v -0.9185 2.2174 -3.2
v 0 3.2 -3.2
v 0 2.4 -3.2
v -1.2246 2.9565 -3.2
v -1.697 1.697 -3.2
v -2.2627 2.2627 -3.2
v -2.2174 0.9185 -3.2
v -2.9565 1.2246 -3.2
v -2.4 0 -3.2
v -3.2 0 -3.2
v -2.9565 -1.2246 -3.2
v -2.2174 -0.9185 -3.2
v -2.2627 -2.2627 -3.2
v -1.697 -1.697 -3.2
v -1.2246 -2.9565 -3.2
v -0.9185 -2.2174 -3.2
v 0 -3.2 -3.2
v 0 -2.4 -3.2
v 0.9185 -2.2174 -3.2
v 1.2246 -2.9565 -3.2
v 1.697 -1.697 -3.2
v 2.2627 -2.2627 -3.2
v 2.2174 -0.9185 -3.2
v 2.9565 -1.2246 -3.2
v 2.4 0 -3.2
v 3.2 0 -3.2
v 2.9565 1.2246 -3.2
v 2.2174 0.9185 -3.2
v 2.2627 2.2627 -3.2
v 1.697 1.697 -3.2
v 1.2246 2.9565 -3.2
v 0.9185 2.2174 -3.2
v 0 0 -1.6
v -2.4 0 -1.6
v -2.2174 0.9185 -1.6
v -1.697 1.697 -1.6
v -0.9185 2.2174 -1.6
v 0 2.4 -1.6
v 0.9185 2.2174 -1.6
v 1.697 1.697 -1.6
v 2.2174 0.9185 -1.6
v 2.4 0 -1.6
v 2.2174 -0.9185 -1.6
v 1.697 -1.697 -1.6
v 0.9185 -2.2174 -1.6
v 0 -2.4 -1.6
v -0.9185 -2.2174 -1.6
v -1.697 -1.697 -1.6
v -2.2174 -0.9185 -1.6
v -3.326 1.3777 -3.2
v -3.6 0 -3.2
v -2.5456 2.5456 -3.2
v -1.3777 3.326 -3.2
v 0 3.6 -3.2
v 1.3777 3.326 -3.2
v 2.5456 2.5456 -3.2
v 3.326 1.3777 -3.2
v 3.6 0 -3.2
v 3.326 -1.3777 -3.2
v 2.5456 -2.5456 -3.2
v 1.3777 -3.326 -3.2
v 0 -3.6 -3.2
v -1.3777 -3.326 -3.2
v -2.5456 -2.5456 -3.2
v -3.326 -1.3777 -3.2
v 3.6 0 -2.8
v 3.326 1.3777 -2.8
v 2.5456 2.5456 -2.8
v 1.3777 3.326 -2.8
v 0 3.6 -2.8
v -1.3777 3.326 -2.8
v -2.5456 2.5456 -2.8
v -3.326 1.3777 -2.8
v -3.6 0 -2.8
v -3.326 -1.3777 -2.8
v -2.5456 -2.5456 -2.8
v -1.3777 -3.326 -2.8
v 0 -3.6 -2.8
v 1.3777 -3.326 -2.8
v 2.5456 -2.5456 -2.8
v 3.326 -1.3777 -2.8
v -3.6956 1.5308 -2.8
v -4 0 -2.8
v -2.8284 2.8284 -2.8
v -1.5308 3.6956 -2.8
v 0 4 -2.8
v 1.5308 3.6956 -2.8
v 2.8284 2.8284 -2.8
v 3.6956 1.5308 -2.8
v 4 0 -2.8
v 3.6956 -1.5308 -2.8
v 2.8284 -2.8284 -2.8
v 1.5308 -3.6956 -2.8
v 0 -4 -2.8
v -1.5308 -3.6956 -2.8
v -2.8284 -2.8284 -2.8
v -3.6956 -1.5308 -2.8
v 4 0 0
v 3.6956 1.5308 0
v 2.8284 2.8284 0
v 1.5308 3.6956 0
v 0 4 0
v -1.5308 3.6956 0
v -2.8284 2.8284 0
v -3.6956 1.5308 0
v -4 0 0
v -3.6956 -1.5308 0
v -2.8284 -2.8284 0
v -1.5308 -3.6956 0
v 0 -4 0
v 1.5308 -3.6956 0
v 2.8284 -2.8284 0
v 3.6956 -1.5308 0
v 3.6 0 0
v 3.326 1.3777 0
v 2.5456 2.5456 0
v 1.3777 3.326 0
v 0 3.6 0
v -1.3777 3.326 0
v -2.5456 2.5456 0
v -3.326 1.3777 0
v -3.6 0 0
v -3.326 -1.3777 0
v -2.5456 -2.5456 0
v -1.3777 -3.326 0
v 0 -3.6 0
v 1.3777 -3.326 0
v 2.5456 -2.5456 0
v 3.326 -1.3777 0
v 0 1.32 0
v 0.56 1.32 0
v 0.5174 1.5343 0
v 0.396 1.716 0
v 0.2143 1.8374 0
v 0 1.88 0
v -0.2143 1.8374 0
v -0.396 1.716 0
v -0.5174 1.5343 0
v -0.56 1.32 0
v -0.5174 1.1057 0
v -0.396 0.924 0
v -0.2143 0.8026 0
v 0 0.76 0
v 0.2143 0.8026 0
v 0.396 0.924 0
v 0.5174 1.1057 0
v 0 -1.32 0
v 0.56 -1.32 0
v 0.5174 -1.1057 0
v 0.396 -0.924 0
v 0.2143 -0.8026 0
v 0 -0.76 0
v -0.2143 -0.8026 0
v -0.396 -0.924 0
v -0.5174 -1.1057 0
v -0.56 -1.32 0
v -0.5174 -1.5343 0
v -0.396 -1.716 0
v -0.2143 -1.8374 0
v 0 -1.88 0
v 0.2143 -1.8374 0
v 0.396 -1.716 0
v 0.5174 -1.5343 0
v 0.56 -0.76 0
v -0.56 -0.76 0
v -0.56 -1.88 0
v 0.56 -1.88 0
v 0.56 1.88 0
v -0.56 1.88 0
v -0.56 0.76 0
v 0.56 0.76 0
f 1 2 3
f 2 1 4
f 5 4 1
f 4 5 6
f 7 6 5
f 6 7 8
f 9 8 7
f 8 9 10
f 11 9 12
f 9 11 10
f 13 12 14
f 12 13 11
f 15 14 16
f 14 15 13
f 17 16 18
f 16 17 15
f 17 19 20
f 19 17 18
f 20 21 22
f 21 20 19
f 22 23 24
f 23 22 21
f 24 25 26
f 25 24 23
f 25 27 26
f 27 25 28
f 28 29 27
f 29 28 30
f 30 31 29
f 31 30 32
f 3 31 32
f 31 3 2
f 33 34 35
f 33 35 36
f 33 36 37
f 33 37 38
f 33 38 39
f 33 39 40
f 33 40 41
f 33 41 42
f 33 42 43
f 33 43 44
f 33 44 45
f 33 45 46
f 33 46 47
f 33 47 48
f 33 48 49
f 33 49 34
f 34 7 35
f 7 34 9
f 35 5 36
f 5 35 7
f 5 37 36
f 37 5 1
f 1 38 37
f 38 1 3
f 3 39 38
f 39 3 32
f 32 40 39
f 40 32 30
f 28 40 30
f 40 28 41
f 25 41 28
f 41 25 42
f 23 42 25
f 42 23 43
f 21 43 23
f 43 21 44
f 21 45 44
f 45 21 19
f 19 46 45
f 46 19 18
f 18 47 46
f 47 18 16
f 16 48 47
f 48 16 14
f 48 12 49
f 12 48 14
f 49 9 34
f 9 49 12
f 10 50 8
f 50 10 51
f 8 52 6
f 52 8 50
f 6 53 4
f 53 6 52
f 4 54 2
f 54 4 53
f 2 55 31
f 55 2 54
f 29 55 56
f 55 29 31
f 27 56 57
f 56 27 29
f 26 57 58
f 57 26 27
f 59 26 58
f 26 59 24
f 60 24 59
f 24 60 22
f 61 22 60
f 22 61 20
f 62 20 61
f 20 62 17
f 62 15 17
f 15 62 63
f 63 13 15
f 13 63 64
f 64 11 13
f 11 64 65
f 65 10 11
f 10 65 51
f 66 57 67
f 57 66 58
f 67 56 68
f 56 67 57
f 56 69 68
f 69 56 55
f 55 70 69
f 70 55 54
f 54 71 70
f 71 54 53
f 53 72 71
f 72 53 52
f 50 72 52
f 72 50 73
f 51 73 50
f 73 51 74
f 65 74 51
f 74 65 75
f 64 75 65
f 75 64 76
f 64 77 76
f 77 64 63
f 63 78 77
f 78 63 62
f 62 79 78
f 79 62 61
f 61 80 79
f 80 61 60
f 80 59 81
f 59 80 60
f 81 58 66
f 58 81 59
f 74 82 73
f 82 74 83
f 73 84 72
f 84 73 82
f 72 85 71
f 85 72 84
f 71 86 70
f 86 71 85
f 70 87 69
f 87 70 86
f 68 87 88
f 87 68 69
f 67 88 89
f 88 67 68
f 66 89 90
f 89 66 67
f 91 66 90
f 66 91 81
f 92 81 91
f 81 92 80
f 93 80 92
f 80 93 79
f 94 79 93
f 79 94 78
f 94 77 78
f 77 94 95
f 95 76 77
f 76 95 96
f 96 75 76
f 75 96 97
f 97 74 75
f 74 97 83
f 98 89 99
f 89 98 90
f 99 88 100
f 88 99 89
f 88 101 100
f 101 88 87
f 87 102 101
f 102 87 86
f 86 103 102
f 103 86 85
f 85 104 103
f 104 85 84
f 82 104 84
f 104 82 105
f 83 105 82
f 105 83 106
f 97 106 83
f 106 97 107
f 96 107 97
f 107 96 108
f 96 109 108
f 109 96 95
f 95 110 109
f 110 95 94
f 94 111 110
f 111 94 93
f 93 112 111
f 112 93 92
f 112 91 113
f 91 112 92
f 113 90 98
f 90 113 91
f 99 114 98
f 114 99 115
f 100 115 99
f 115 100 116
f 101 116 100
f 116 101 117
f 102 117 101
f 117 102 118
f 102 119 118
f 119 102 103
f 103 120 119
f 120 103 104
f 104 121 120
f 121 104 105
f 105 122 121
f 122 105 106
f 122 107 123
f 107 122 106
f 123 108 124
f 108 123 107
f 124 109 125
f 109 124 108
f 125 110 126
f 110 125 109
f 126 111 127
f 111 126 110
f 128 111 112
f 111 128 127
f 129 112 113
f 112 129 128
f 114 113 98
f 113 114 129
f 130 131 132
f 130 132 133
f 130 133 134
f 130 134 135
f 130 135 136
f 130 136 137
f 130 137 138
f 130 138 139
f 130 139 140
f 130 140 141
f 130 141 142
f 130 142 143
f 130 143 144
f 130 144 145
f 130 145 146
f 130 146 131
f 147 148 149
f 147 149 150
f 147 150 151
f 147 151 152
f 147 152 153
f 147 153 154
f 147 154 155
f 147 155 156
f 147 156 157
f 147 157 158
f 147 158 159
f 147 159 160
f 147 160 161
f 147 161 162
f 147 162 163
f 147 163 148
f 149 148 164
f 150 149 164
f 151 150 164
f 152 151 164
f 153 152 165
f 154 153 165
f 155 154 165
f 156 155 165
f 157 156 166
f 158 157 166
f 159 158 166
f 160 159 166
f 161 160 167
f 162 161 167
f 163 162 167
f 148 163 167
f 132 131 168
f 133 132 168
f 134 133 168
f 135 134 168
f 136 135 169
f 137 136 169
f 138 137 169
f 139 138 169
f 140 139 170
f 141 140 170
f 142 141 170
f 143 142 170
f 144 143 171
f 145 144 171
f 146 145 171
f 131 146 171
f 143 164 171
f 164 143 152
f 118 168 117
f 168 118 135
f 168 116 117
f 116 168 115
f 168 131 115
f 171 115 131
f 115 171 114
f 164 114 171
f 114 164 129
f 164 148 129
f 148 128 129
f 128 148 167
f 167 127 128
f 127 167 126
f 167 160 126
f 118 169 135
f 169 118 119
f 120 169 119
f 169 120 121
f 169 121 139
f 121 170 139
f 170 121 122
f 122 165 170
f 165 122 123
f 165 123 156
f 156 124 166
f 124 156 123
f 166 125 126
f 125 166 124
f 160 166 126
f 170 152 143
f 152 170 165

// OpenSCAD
// file: ../p/4-4ring3.scad
use <../lib.scad>
function ldraw_lib__4_4ring3() = [
// 0 Ring  3 x 1.0
// 0 Name: 4-4ring3.dat
// 0 Author: James Jessiman
// 0 !LDRAW_ORG Primitive UPDATE 2009-01
// 0 !LICENSE Licensed under CC BY 2.0 and CC BY 4.0 : see CAreadme.txt
// 
// 0 BFC CERTIFY CCW
  [0,"BFC","CERTIFY"],
  [0,"BFC","CCW"],
// 
// 0 !HISTORY 1998-12-15 [PTadmin] Official Update 1998-10
// 0 !HISTORY 2002-04-05 [hafhead] Added BFC statement
// 0 !HISTORY 2002-04-25 [PTadmin] Official Update 2002-02
// 0 !HISTORY 2007-06-24 [PTadmin] Header formatted for Contributor Agreement
// 0 !HISTORY 2008-07-01 [PTadmin] Official Update 2008-01
// 0 !HISTORY 2008-08-26 [cwdee] Switch polygon winding and rename
// 0 !HISTORY 2009-05-02 [PTadmin] Official Update 2009-01
// 
// 
// 4 16 -1.5308 0 3.6956 -1.1481 0 2.7717 0 0 3 0 0 4
  [4,16,-1.5308,0,3.6956,-1.1481,0,2.7717,0,0,3,0,0,4],
// 4 16 -2.8284 0 2.8284 -2.1213 0 2.1213 -1.1481 0 2.7717 -1.5308 0 3.6956
  [4,16,-2.8284,0,2.8284,-2.1213,0,2.1213,-1.1481,0,2.7717,-1.5308,0,3.6956],
// 4 16 -3.6956 0 1.5308 -2.7717 0 1.1481 -2.1213 0 2.1213 -2.8284 0 2.8284
  [4,16,-3.6956,0,1.5308,-2.7717,0,1.1481,-2.1213,0,2.1213,-2.8284,0,2.8284],
// 4 16 -4 0 0 -3 0 0 -2.7717 0 1.1481 -3.6956 0 1.5308
  [4,16,-4,0,0,-3,0,0,-2.7717,0,1.1481,-3.6956,0,1.5308],
// 4 16 -3.6956 0 -1.5308 -2.7717 0 -1.1481 -3 0 0 -4 0 0
  [4,16,-3.6956,0,-1.5308,-2.7717,0,-1.1481,-3,0,0,-4,0,0],
// 4 16 -2.8284 0 -2.8284 -2.1213 0 -2.1213 -2.7717 0 -1.1481 -3.6956 0 -1.5308
  [4,16,-2.8284,0,-2.8284,-2.1213,0,-2.1213,-2.7717,0,-1.1481,-3.6956,0,-1.5308],
// 4 16 -1.5308 0 -3.6956 -1.1481 0 -2.7717 -2.1213 0 -2.1213 -2.8284 0 -2.8284
  [4,16,-1.5308,0,-3.6956,-1.1481,0,-2.7717,-2.1213,0,-2.1213,-2.8284,0,-2.8284],
// 4 16 0 0 -4 0 0 -3 -1.1481 0 -2.7717 -1.5308 0 -3.6956
  [4,16,0,0,-4,0,0,-3,-1.1481,0,-2.7717,-1.5308,0,-3.6956],
// 4 16 1.5308 0 -3.6956 1.1481 0 -2.7717 0 0 -3 0 0 -4
  [4,16,1.5308,0,-3.6956,1.1481,0,-2.7717,0,0,-3,0,0,-4],
// 4 16 2.8284 0 -2.8284 2.1213 0 -2.1213 1.1481 0 -2.7717 1.5308 0 -3.6956
  [4,16,2.8284,0,-2.8284,2.1213,0,-2.1213,1.1481,0,-2.7717,1.5308,0,-3.6956],
// 4 16 3.6956 0 -1.5308 2.7717 0 -1.1481 2.1213 0 -2.1213 2.8284 0 -2.8284
  [4,16,3.6956,0,-1.5308,2.7717,0,-1.1481,2.1213,0,-2.1213,2.8284,0,-2.8284],
// 4 16 4 0 0 3 0 0 2.7717 0 -1.1481 3.6956 0 -1.5308
  [4,16,4,0,0,3,0,0,2.7717,0,-1.1481,3.6956,0,-1.5308],
// 4 16 3.6956 0 1.5308 2.7717 0 1.1481 3 0 0 4 0 0
  [4,16,3.6956,0,1.5308,2.7717,0,1.1481,3,0,0,4,0,0],
// 4 16 2.8284 0 2.8284 2.1213 0 2.1213 2.7717 0 1.1481 3.6956 0 1.5308
  [4,16,2.8284,0,2.8284,2.1213,0,2.1213,2.7717,0,1.1481,3.6956,0,1.5308],
// 4 16 1.5308 0 3.6956 1.1481 0 2.7717 2.1213 0 2.1213 2.8284 0 2.8284
  [4,16,1.5308,0,3.6956,1.1481,0,2.7717,2.1213,0,2.1213,2.8284,0,2.8284],
// 4 16 0 0 4 0 0 3 1.1481 0 2.7717 1.5308 0 3.6956
  [4,16,0,0,4,0,0,3,1.1481,0,2.7717,1.5308,0,3.6956],
// 0
];
module ldraw_lib__4_4ring3(step=0, col=false, unit=2/5, alt=false, line=0.2, solid=!$preview)
    makepoly(ldraw_lib__4_4ring3(), step=step, col=col, unit=unit, alt=alt, line=line, solid=solid);
ldraw_lib__4_4ring3(line=0.2);
// file: ../p/4-4cylc.scad
use <../lib.scad>
use <4-4cyli.scad>
use <4-4disc.scad>
use <4-4edge.scad>
function ldraw_lib__4_4cylc() = [
// 0 Cylinder Closed 1.0
// 0 Name: 4-4cylc.dat
// 0 Author: Alex Taylor [anathema]
// 0 !LDRAW_ORG Primitive UPDATE 2009-02
// 0 !LICENSE Licensed under CC BY 2.0 and CC BY 4.0 : see CAreadme.txt
// 
// 0 BFC CERTIFY CCW
  [0,"BFC","CERTIFY"],
  [0,"BFC","CCW"],
// 
// 0 !HISTORY 2008-12-29 [cwdee] Removed one disc
// 0 !HISTORY 2009-09-03 [PTadmin] Official Update 2009-02
// 
// 
// 1 16 0 0 0 1 0 0 0 1 0 0 0 1 4-4edge.dat
  [1,16,0,0,0,1,0,0,0,1,0,0,0,1, ldraw_lib__4_4edge()],
// 1 16 0 1 0 1 0 0 0 1 0 0 0 1 4-4edge.dat
  [1,16,0,1,0,1,0,0,0,1,0,0,0,1, ldraw_lib__4_4edge()],
// 1 16 0 0 0 1 0 0 0 1 0 0 0 1 4-4disc.dat
  [1,16,0,0,0,1,0,0,0,1,0,0,0,1, ldraw_lib__4_4disc()],
// 1 16 0 0 0 1 0 0 0 1 0 0 0 1 4-4cyli.dat
  [1,16,0,0,0,1,0,0,0,1,0,0,0,1, ldraw_lib__4_4cyli()],
// 0
];
module ldraw_lib__4_4cylc(step=0, col=false, unit=2/5, alt=false, line=0.2, solid=!$preview)
    makepoly(ldraw_lib__4_4cylc(), step=step, col=col, unit=unit, alt=alt, line=line, solid=solid);
ldraw_lib__4_4cylc(line=0.2);
// file: ../p/4-4edge.scad
use <../lib.scad>
function ldraw_lib__4_4edge() = [
// 0 Circle 1.0
// 0 Name: 4-4edge.dat
// 0 Author: James Jessiman
// 0 !LDRAW_ORG Primitive UPDATE 2017-01
// 0 !LICENSE Licensed under CC BY 4.0 : see CAreadme.txt
// 
// 0 BFC CERTIFY CCW
  [0,"BFC","CERTIFY"],
  [0,"BFC","CCW"],
// 
// 0 !HISTORY 1998-12-15 [PTadmin] Official Update 1998-10
// 0 !HISTORY 2005-12-28 [PTadmin] Official Update 2005-01
// 0 !HISTORY 2007-06-24 [PTadmin] Header formatted for Contributor Agreement
// 0 !HISTORY 2008-07-01 [PTadmin] Official Update 2008-01
// 0 !HISTORY 2017-01-15 [Steffen] BFCed
// 0 !HISTORY 2017-12-30 [PTadmin] Official Update 2017-01
// 
// 
// 2 24 1 0 0 0.9239 0 0.3827
  [2,24,1,0,0,0.9239,0,0.3827],
// 2 24 0.9239 0 0.3827 0.7071 0 0.7071
  [2,24,0.9239,0,0.3827,0.7071,0,0.7071],
// 2 24 0.7071 0 0.7071 0.3827 0 0.9239
  [2,24,0.7071,0,0.7071,0.3827,0,0.9239],
// 2 24 0.3827 0 0.9239 0 0 1
  [2,24,0.3827,0,0.9239,0,0,1],
// 2 24 0 0 1 -0.3827 0 0.9239
  [2,24,0,0,1,-0.3827,0,0.9239],
// 2 24 -0.3827 0 0.9239 -0.7071 0 0.7071
  [2,24,-0.3827,0,0.9239,-0.7071,0,0.7071],
// 2 24 -0.7071 0 0.7071 -0.9239 0 0.3827
  [2,24,-0.7071,0,0.7071,-0.9239,0,0.3827],
// 2 24 -0.9239 0 0.3827 -1 0 -0
  [2,24,-0.9239,0,0.3827,-1,0,-0],
// 2 24 -1 0 -0 -0.9239 0 -0.3827
  [2,24,-1,0,-0,-0.9239,0,-0.3827],
// 2 24 -0.9239 0 -0.3827 -0.7071 0 -0.7071
  [2,24,-0.9239,0,-0.3827,-0.7071,0,-0.7071],
// 2 24 -0.7071 0 -0.7071 -0.3827 0 -0.9239
  [2,24,-0.7071,0,-0.7071,-0.3827,0,-0.9239],
// 2 24 -0.3827 0 -0.9239 0 0 -1
  [2,24,-0.3827,0,-0.9239,0,0,-1],
// 2 24 0 0 -1 0.3827 0 -0.9239
  [2,24,0,0,-1,0.3827,0,-0.9239],
// 2 24 0.3827 0 -0.9239 0.7071 0 -0.7071
  [2,24,0.3827,0,-0.9239,0.7071,0,-0.7071],
// 2 24 0.7071 0 -0.7071 0.9239 0 -0.3827
  [2,24,0.7071,0,-0.7071,0.9239,0,-0.3827],
// 2 24 0.9239 0 -0.3827 1 0 0
  [2,24,0.9239,0,-0.3827,1,0,0],
];
module ldraw_lib__4_4edge(step=0, col=false, unit=2/5, alt=false, line=0.2, solid=!$preview)
    makepoly(ldraw_lib__4_4edge(), step=step, col=col, unit=unit, alt=alt, line=line, solid=solid);
ldraw_lib__4_4edge(line=0.2);
// file: ../p/4-4cyli.scad
use <../lib.scad>
function ldraw_lib__4_4cyli() = [
// 0 Cylinder 1.0
// 0 Name: 4-4cyli.dat
// 0 Author: James Jessiman
// 0 !LDRAW_ORG Primitive UPDATE 2005-01
// 0 !LICENSE Licensed under CC BY 2.0 and CC BY 4.0 : see CAreadme.txt
// 
// 0 BFC CERTIFY CCW
  [0,"BFC","CERTIFY"],
  [0,"BFC","CCW"],
// 
// 0 !HISTORY 1998-12-15 [PTadmin] Official Update 1998-10
// 0 !HISTORY 2002-03-23 [sbliss] Added BFC statement; merged headers from files in distributions LDraw 0.27 and Complete.
// 0 !HISTORY 2002-04-25 [PTadmin] Official Update 2002-02
// 0 !HISTORY 2004-12-14 [guyvivan] BFC CCW
// 0 !HISTORY 2005-12-28 [PTadmin] Official Update 2005-01
// 0 !HISTORY 2007-06-24 [PTadmin] Header formatted for Contributor Agreement
// 0 !HISTORY 2008-07-01 [PTadmin] Official Update 2008-01
// 
// 
// 4 16 1 1 0 0.9239 1 0.3827 0.9239 0 0.3827 1 0 0
  [4,16,1,1,0,0.9239,1,0.3827,0.9239,0,0.3827,1,0,0],
// 5 24 1 0 0 1 1 0 0.9239 0 0.3827 0.9239 0 -0.3827
  [5,24,1,0,0,1,1,0,0.9239,0,0.3827,0.9239,0,-0.3827],
// 4 16 0.9239 1 0.3827 0.7071 1 0.7071 0.7071 0 0.7071 0.9239 0 0.3827
  [4,16,0.9239,1,0.3827,0.7071,1,0.7071,0.7071,0,0.7071,0.9239,0,0.3827],
// 5 24 0.9239 0 0.3827 0.9239 1 0.3827 0.7071 0 0.7071 1 0 0
  [5,24,0.9239,0,0.3827,0.9239,1,0.3827,0.7071,0,0.7071,1,0,0],
// 4 16 0.7071 1 0.7071 0.3827 1 0.9239 0.3827 0 0.9239 0.7071 0 0.7071
  [4,16,0.7071,1,0.7071,0.3827,1,0.9239,0.3827,0,0.9239,0.7071,0,0.7071],
// 5 24 0.7071 0 0.7071 0.7071 1 0.7071 0.3827 0 0.9239 0.9239 0 0.3827
  [5,24,0.7071,0,0.7071,0.7071,1,0.7071,0.3827,0,0.9239,0.9239,0,0.3827],
// 4 16 0.3827 1 0.9239 0 1 1 0 0 1 0.3827 0 0.9239
  [4,16,0.3827,1,0.9239,0,1,1,0,0,1,0.3827,0,0.9239],
// 5 24 0.3827 0 0.9239 0.3827 1 0.9239 0 0 1 0.7071 0 0.7071
  [5,24,0.3827,0,0.9239,0.3827,1,0.9239,0,0,1,0.7071,0,0.7071],
// 4 16 0 1 1 -0.3827 1 0.9239 -0.3827 0 0.9239 0 0 1
  [4,16,0,1,1,-0.3827,1,0.9239,-0.3827,0,0.9239,0,0,1],
// 5 24 0 0 1 0 1 1 -0.3827 0 0.9239 0.3827 0 0.9239
  [5,24,0,0,1,0,1,1,-0.3827,0,0.9239,0.3827,0,0.9239],
// 4 16 -0.3827 1 0.9239 -0.7071 1 0.7071 -0.7071 0 0.7071 -0.3827 0 0.9239
  [4,16,-0.3827,1,0.9239,-0.7071,1,0.7071,-0.7071,0,0.7071,-0.3827,0,0.9239],
// 5 24 -0.3827 0 0.9239 -0.3827 1 0.9239 -0.7071 0 0.7071 0 0 1
  [5,24,-0.3827,0,0.9239,-0.3827,1,0.9239,-0.7071,0,0.7071,0,0,1],
// 4 16 -0.7071 1 0.7071 -0.9239 1 0.3827 -0.9239 0 0.3827 -0.7071 0 0.7071
  [4,16,-0.7071,1,0.7071,-0.9239,1,0.3827,-0.9239,0,0.3827,-0.7071,0,0.7071],
// 5 24 -0.7071 0 0.7071 -0.7071 1 0.7071 -0.9239 0 0.3827 -0.3827 0 0.9239
  [5,24,-0.7071,0,0.7071,-0.7071,1,0.7071,-0.9239,0,0.3827,-0.3827,0,0.9239],
// 4 16 -0.9239 1 0.3827 -1 1 0 -1 0 0 -0.9239 0 0.3827
  [4,16,-0.9239,1,0.3827,-1,1,0,-1,0,0,-0.9239,0,0.3827],
// 5 24 -0.9239 0 0.3827 -0.9239 1 0.3827 -1 0 0 -0.7071 0 0.7071
  [5,24,-0.9239,0,0.3827,-0.9239,1,0.3827,-1,0,0,-0.7071,0,0.7071],
// 4 16 -1 1 0 -0.9239 1 -0.3827 -0.9239 0 -0.3827 -1 0 0
  [4,16,-1,1,0,-0.9239,1,-0.3827,-0.9239,0,-0.3827,-1,0,0],
// 5 24 -1 0 0 -1 1 0 -0.9239 0 -0.3827 -0.9239 0 0.3827
  [5,24,-1,0,0,-1,1,0,-0.9239,0,-0.3827,-0.9239,0,0.3827],
// 4 16 -0.9239 1 -0.3827 -0.7071 1 -0.7071 -0.7071 0 -0.7071 -0.9239 0 -0.3827
  [4,16,-0.9239,1,-0.3827,-0.7071,1,-0.7071,-0.7071,0,-0.7071,-0.9239,0,-0.3827],
// 5 24 -0.9239 0 -0.3827 -0.9239 1 -0.3827 -0.7071 0 -0.7071 -1 0 0
  [5,24,-0.9239,0,-0.3827,-0.9239,1,-0.3827,-0.7071,0,-0.7071,-1,0,0],
// 4 16 -0.7071 1 -0.7071 -0.3827 1 -0.9239 -0.3827 0 -0.9239 -0.7071 0 -0.7071
  [4,16,-0.7071,1,-0.7071,-0.3827,1,-0.9239,-0.3827,0,-0.9239,-0.7071,0,-0.7071],
// 5 24 -0.7071 0 -0.7071 -0.7071 1 -0.7071 -0.3827 0 -0.9239 -0.9239 0 -0.3827
  [5,24,-0.7071,0,-0.7071,-0.7071,1,-0.7071,-0.3827,0,-0.9239,-0.9239,0,-0.3827],
// 4 16 -0.3827 1 -0.9239 0 1 -1 0 0 -1 -0.3827 0 -0.9239
  [4,16,-0.3827,1,-0.9239,0,1,-1,0,0,-1,-0.3827,0,-0.9239],
// 5 24 -0.3827 0 -0.9239 -0.3827 1 -0.9239 0 0 -1 -0.7071 0 -0.7071
  [5,24,-0.3827,0,-0.9239,-0.3827,1,-0.9239,0,0,-1,-0.7071,0,-0.7071],
// 4 16 0 1 -1 0.3827 1 -0.9239 0.3827 0 -0.9239 0 0 -1
  [4,16,0,1,-1,0.3827,1,-0.9239,0.3827,0,-0.9239,0,0,-1],
// 5 24 0 0 -1 0 1 -1 0.3827 0 -0.9239 -0.3827 0 -0.9239
  [5,24,0,0,-1,0,1,-1,0.3827,0,-0.9239,-0.3827,0,-0.9239],
// 4 16 0.3827 1 -0.9239 0.7071 1 -0.7071 0.7071 0 -0.7071 0.3827 0 -0.9239
  [4,16,0.3827,1,-0.9239,0.7071,1,-0.7071,0.7071,0,-0.7071,0.3827,0,-0.9239],
// 5 24 0.3827 0 -0.9239 0.3827 1 -0.9239 0.7071 0 -0.7071 0 0 -1
  [5,24,0.3827,0,-0.9239,0.3827,1,-0.9239,0.7071,0,-0.7071,0,0,-1],
// 4 16 0.7071 1 -0.7071 0.9239 1 -0.3827 0.9239 0 -0.3827 0.7071 0 -0.7071
  [4,16,0.7071,1,-0.7071,0.9239,1,-0.3827,0.9239,0,-0.3827,0.7071,0,-0.7071],
// 5 24 0.7071 0 -0.7071 0.7071 1 -0.7071 0.9239 0 -0.3827 0.3827 0 -0.9239
  [5,24,0.7071,0,-0.7071,0.7071,1,-0.7071,0.9239,0,-0.3827,0.3827,0,-0.9239],
// 4 16 0.9239 1 -0.3827 1 1 0 1 0 0 0.9239 0 -0.3827
  [4,16,0.9239,1,-0.3827,1,1,0,1,0,0,0.9239,0,-0.3827],
// 5 24 0.9239 0 -0.3827 0.9239 1 -0.3827 1 0 0 0.7071 0 -0.7071
  [5,24,0.9239,0,-0.3827,0.9239,1,-0.3827,1,0,0,0.7071,0,-0.7071],
// 0
];
module ldraw_lib__4_4cyli(step=0, col=false, unit=2/5, alt=false, line=0.2, solid=!$preview)
    makepoly(ldraw_lib__4_4cyli(), step=step, col=col, unit=unit, alt=alt, line=line, solid=solid);
ldraw_lib__4_4cyli(line=0.2);
// file: ../p/stud4o.scad
use <../lib.scad>
use <4-4cylc.scad>
use <4-4ring3.scad>
function ldraw_lib__stud4o() = [
// 0 Stud Tube Open without Outer Cylinder
// 0 Name: stud4o.dat
// 0 Author: Magnus Forsberg [MagFors]
// 0 !LDRAW_ORG Primitive UPDATE 2011-02
// 0 !LICENSE Licensed under CC BY 4.0 : see CAreadme.txt
// 
// 0 !HELP This stud is a "antistud" to be used like a underside stud,
// 0 !HELP but without the outer cylinder.
// 0 !HELP 1 47 0 0 0 1 0 0 0 1 0 0 0 1 stud4.dat
// 
// 0 BFC CERTIFY CCW
  [0,"BFC","CERTIFY"],
  [0,"BFC","CCW"],
// 
// 0 !HISTORY 2011-12-29 [PTadmin] Official Update 2011-02
// 
// 
// 1 16 0 -4 0 2 0 0 0 1 0 0 0 2 4-4ring3.dat
  [1,16,0,-4,0,2,0,0,0,1,0,0,0,2, ldraw_lib__4_4ring3()],
// 0 BFC INVERTNEXT
  [0,"BFC","INVERTNEXT"],
// 1 16 0 0 0 -6 0 0 0 -4 0 0 0 6 4-4cylc.dat
  [1,16,0,0,0,-6,0,0,0,-4,0,0,0,6, ldraw_lib__4_4cylc()],
];
module ldraw_lib__stud4o(step=0, col=false, unit=2/5, alt=false, line=0.2, solid=!$preview)
    makepoly(ldraw_lib__stud4o(), step=step, col=col, unit=unit, alt=alt, line=line, solid=solid);
ldraw_lib__stud4o(line=0.2);
// file: ../p/4-4ring8.scad
use <../lib.scad>
function ldraw_lib__4_4ring8() = [
// 0 Ring  8 x 1.0
// 0 Name: 4-4ring8.dat
// 0 Author: Steffen [Steffen]
// 0 !LDRAW_ORG Primitive UPDATE 2012-01
// 0 !LICENSE Licensed under CC BY 4.0 : see CAreadme.txt
// 
// 0 BFC CERTIFY CCW
  [0,"BFC","CERTIFY"],
  [0,"BFC","CCW"],
// 
// 0 !HISTORY 2003-12-19 [PTadmin] Official Update 2003-03
// 0 !HISTORY 2007-06-24 [PTadmin] Header formatted for Contributor Agreement
// 0 !HISTORY 2008-07-01 [PTadmin] Official Update 2008-01
// 0 !HISTORY 2012-02-16 [Philo] Changed to CCW
// 0 !HISTORY 2012-03-30 [PTadmin] Official Update 2012-01
// 
// 
// 4 16 9 0 0 8.3151 0 3.4443 7.3912 0 3.0616 8 0 0
  [4,16,9,0,0,8.3151,0,3.4443,7.3912,0,3.0616,8,0,0],
// 4 16 8.3151 0 3.4443 6.3639 0 6.3639 5.6568 0 5.6568 7.3912 0 3.0616
  [4,16,8.3151,0,3.4443,6.3639,0,6.3639,5.6568,0,5.6568,7.3912,0,3.0616],
// 4 16 6.3639 0 6.3639 3.4443 0 8.3151 3.0616 0 7.3912 5.6568 0 5.6568
  [4,16,6.3639,0,6.3639,3.4443,0,8.3151,3.0616,0,7.3912,5.6568,0,5.6568],
// 4 16 3.4443 0 8.3151 0 0 9 0 0 8 3.0616 0 7.3912
  [4,16,3.4443,0,8.3151,0,0,9,0,0,8,3.0616,0,7.3912],
// 4 16 0 0 9 -3.4443 0 8.3151 -3.0616 0 7.3912 0 0 8
  [4,16,0,0,9,-3.4443,0,8.3151,-3.0616,0,7.3912,0,0,8],
// 4 16 -3.4443 0 8.3151 -6.3639 0 6.3639 -5.6568 0 5.6568 -3.0616 0 7.3912
  [4,16,-3.4443,0,8.3151,-6.3639,0,6.3639,-5.6568,0,5.6568,-3.0616,0,7.3912],
// 4 16 -6.3639 0 6.3639 -8.3151 0 3.4443 -7.3912 0 3.0616 -5.6568 0 5.6568
  [4,16,-6.3639,0,6.3639,-8.3151,0,3.4443,-7.3912,0,3.0616,-5.6568,0,5.6568],
// 4 16 -8.3151 0 3.4443 -9 0 0 -8 0 0 -7.3912 0 3.0616
  [4,16,-8.3151,0,3.4443,-9,0,0,-8,0,0,-7.3912,0,3.0616],
// 4 16 -9 0 0 -8.3151 0 -3.4443 -7.3912 0 -3.0616 -8 0 0
  [4,16,-9,0,0,-8.3151,0,-3.4443,-7.3912,0,-3.0616,-8,0,0],
// 4 16 -8.3151 0 -3.4443 -6.3639 0 -6.3639 -5.6568 0 -5.6568 -7.3912 0 -3.0616
  [4,16,-8.3151,0,-3.4443,-6.3639,0,-6.3639,-5.6568,0,-5.6568,-7.3912,0,-3.0616],
// 4 16 -6.3639 0 -6.3639 -3.4443 0 -8.3151 -3.0616 0 -7.3912 -5.6568 0 -5.6568
  [4,16,-6.3639,0,-6.3639,-3.4443,0,-8.3151,-3.0616,0,-7.3912,-5.6568,0,-5.6568],
// 4 16 -3.4443 0 -8.3151 0 0 -9 0 0 -8 -3.0616 0 -7.3912
  [4,16,-3.4443,0,-8.3151,0,0,-9,0,0,-8,-3.0616,0,-7.3912],
// 4 16 0 0 -9 3.4443 0 -8.3151 3.0616 0 -7.3912 0 0 -8
  [4,16,0,0,-9,3.4443,0,-8.3151,3.0616,0,-7.3912,0,0,-8],
// 4 16 3.4443 0 -8.3151 6.3639 0 -6.3639 5.6568 0 -5.6568 3.0616 0 -7.3912
  [4,16,3.4443,0,-8.3151,6.3639,0,-6.3639,5.6568,0,-5.6568,3.0616,0,-7.3912],
// 4 16 6.3639 0 -6.3639 8.3151 0 -3.4443 7.3912 0 -3.0616 5.6568 0 -5.6568
  [4,16,6.3639,0,-6.3639,8.3151,0,-3.4443,7.3912,0,-3.0616,5.6568,0,-5.6568],
// 4 16 8.3151 0 -3.4443 9 0 0 8 0 0 7.3912 0 -3.0616
  [4,16,8.3151,0,-3.4443,9,0,0,8,0,0,7.3912,0,-3.0616],
];
module ldraw_lib__4_4ring8(step=0, col=false, unit=2/5, alt=false, line=0.2, solid=!$preview)
    makepoly(ldraw_lib__4_4ring8(), step=step, col=col, unit=unit, alt=alt, line=line, solid=solid);
ldraw_lib__4_4ring8(line=0.2);
// file: ../p/4-4cylo.scad
use <../lib.scad>
use <4-4cyli.scad>
use <4-4edge.scad>
function ldraw_lib__4_4cylo() = [
// 0 Cylinder Open 1.0
// 0 Name: 4-4cylo.dat
// 0 Author: Mark Kennedy [mkennedy]
// 0 !LDRAW_ORG Primitive UPDATE 2010-01
// 0 !LICENSE Licensed under CC BY 4.0 : see CAreadme.txt
// 
// 0 BFC CERTIFY CCW
  [0,"BFC","CERTIFY"],
  [0,"BFC","CCW"],
// 
// 0 !HISTORY 2010-04-05 [PTadmin] Official Update 2010-01
// 
// 
// 1 16 0 0 0 1 0 0 0 1 0 0 0 1 4-4edge.dat
  [1,16,0,0,0,1,0,0,0,1,0,0,0,1, ldraw_lib__4_4edge()],
// 1 16 0 1 0 1 0 0 0 1 0 0 0 1 4-4edge.dat
  [1,16,0,1,0,1,0,0,0,1,0,0,0,1, ldraw_lib__4_4edge()],
// 1 16 0 0 0 1 0 0 0 1 0 0 0 1 4-4cyli.dat
  [1,16,0,0,0,1,0,0,0,1,0,0,0,1, ldraw_lib__4_4cyli()],
// 0
];
module ldraw_lib__4_4cylo(step=0, col=false, unit=2/5, alt=false, line=0.2, solid=!$preview)
    makepoly(ldraw_lib__4_4cylo(), step=step, col=col, unit=unit, alt=alt, line=line, solid=solid);
ldraw_lib__4_4cylo(line=0.2);
// file: ../p/empty.scad
use <../lib.scad>
function ldraw_lib__empty() = [
// 0 Empty
// 0 Name: empty.dat
// 0 Author: Steffen [Steffen]
// 0 !LDRAW_ORG Primitive UPDATE 2015-01
// 0 !LICENSE Licensed under CC BY 4.0 : see CAreadme.txt
// 
// 0 BFC CERTIFY CCW
  [0,"BFC","CERTIFY"],
  [0,"BFC","CCW"],
// 
// 0 !HISTORY 2015-10-11 [PTadmin] Official Update 2015-01
// 
// 
// 0 // Tool MLCad cannot handle really empty files. This file is used as a workaround.
// 0 // It exceptionally contains forbidden non-LDRAW standard syntax to satisfy MLCad until it is fixed OR a different editor has become the de-facto LDRAW standard.
// 0 // The line being used here is an "impossible" conditional line which never should be visible,
// 0 // additionally hidden by a syntax explicitly hiding it from displaying.
// 
// 0 MLCAD HIDE 5 24 0 0 0 0.0001 0 0 0.0001 -0.0001 0 0 0 0
];
module ldraw_lib__empty(step=0, col=false, unit=2/5, alt=false, line=0.2, solid=!$preview)
    makepoly(ldraw_lib__empty(), step=step, col=col, unit=unit, alt=alt, line=line, solid=solid);
ldraw_lib__empty(line=0.2);
// file: s/98138s02.scad
use <../../lib.scad>
use <../../p/4-4cylo.scad>
use <../../p/4-4ring8.scad>
use <../../p/4-4ring9.scad>
use <../../p/stud4o.scad>
function ldraw_lib__s__98138s02() = [
// 0 ~Tile  1 x  1 Round with Groove without Complete Top Face
// 0 Name: s\98138s02.dat
// 0 Author: Magnus Forsberg [MagFors]
// 0 !LDRAW_ORG Subpart UPDATE 2020-01
// 0 !LICENSE Licensed under CC BY 4.0 : see CAreadme.txt
// 
// 0 BFC CERTIFY CCW
  [0,"BFC","CERTIFY"],
  [0,"BFC","CCW"],
// 
// 0 !HISTORY 2020-06-28 [PTadmin] Official Update 2020-01
// 
// 
// 1 16 0 4 0 1 0 0 0 -1 0 0 0 1 stud4o.dat
  [1,16,0,4,0,1,0,0,0,-1,0,0,0,1, ldraw_lib__stud4o()],
// 1 16 0 8 0 -1 0 0 0 -1 0 0 0 1 4-4ring8.dat
  [1,16,0,8,0,-1,0,0,0,-1,0,0,0,1, ldraw_lib__4_4ring8()],
// 1 16 0 7 0 9 0 0 0 1 0 0 0 9 4-4cylo.dat
  [1,16,0,7,0,9,0,0,0,1,0,0,0,9, ldraw_lib__4_4cylo()],
// 1 16 0 7 0 -1 0 0 0 -1 0 0 0 1 4-4ring9.dat
  [1,16,0,7,0,-1,0,0,0,-1,0,0,0,1, ldraw_lib__4_4ring9()],
// 1 16 0 0 0 10 0 0 0 7 0 0 0 10 4-4cylo.dat
  [1,16,0,0,0,10,0,0,0,7,0,0,0,10, ldraw_lib__4_4cylo()],
];
module ldraw_lib__s__98138s02(step=0, col=false, unit=2/5, alt=false, line=0.2, solid=!$preview)
    makepoly(ldraw_lib__s__98138s02(), step=step, col=col, unit=unit, alt=alt, line=line, solid=solid);
ldraw_lib__s__98138s02(line=0.2);
// file: ../p/4-4ring9.scad
use <../lib.scad>
function ldraw_lib__4_4ring9() = [
// 0 Ring  9 x 1.0
// 0 Name: 4-4ring9.dat
// 0 Author: John Riley [jriley]
// 0 !LDRAW_ORG Primitive UPDATE 2004-02
// 0 !LICENSE Licensed under CC BY 2.0 and CC BY 4.0 : see CAreadme.txt
// 
// 0 BFC CERTIFY CCW
  [0,"BFC","CERTIFY"],
  [0,"BFC","CCW"],
// 
// 0 !HISTORY 2004-04-22 [PTadmin] Official Update 2004-02
// 0 !HISTORY 2007-06-24 [PTadmin] Header formatted for Contributor Agreement
// 0 !HISTORY 2008-07-01 [PTadmin] Official Update 2008-01
// 
// 
// 4 16 9 0 0 10 0 0 9.239 0 3.827 8.3151 0 3.4443
  [4,16,9,0,0,10,0,0,9.239,0,3.827,8.3151,0,3.4443],
// 4 16 8.3151 0 3.4443 9.239 0 3.827 7.071 0 7.071 6.3639 0 6.3639
  [4,16,8.3151,0,3.4443,9.239,0,3.827,7.071,0,7.071,6.3639,0,6.3639],
// 4 16 6.3639 0 6.3639 7.071 0 7.071 3.827 0 9.239 3.4443 0 8.3151
  [4,16,6.3639,0,6.3639,7.071,0,7.071,3.827,0,9.239,3.4443,0,8.3151],
// 4 16 3.4443 0 8.3151 3.827 0 9.239 0 0 10 0 0 9
  [4,16,3.4443,0,8.3151,3.827,0,9.239,0,0,10,0,0,9],
// 4 16 0 0 9 0 0 10 -3.827 0 9.239 -3.4443 0 8.3151
  [4,16,0,0,9,0,0,10,-3.827,0,9.239,-3.4443,0,8.3151],
// 4 16 -3.4443 0 8.3151 -3.827 0 9.239 -7.071 0 7.071 -6.3639 0 6.3639
  [4,16,-3.4443,0,8.3151,-3.827,0,9.239,-7.071,0,7.071,-6.3639,0,6.3639],
// 4 16 -6.3639 0 6.3639 -7.071 0 7.071 -9.239 0 3.827 -8.3151 0 3.4443
  [4,16,-6.3639,0,6.3639,-7.071,0,7.071,-9.239,0,3.827,-8.3151,0,3.4443],
// 4 16 -8.3151 0 3.4443 -9.239 0 3.827 -10 0 0 -9 0 0
  [4,16,-8.3151,0,3.4443,-9.239,0,3.827,-10,0,0,-9,0,0],
// 4 16 -9 0 0 -10 0 0 -9.239 0 -3.827 -8.3151 0 -3.4443
  [4,16,-9,0,0,-10,0,0,-9.239,0,-3.827,-8.3151,0,-3.4443],
// 4 16 -8.3151 0 -3.4443 -9.239 0 -3.827 -7.071 0 -7.071 -6.3639 0 -6.3639
  [4,16,-8.3151,0,-3.4443,-9.239,0,-3.827,-7.071,0,-7.071,-6.3639,0,-6.3639],
// 4 16 -6.3639 0 -6.3639 -7.071 0 -7.071 -3.827 0 -9.239 -3.4443 0 -8.3151
  [4,16,-6.3639,0,-6.3639,-7.071,0,-7.071,-3.827,0,-9.239,-3.4443,0,-8.3151],
// 4 16 -3.4443 0 -8.3151 -3.827 0 -9.239 0 0 -10 0 0 -9
  [4,16,-3.4443,0,-8.3151,-3.827,0,-9.239,0,0,-10,0,0,-9],
// 4 16 0 0 -9 0 0 -10 3.827 0 -9.239 3.4443 0 -8.3151
  [4,16,0,0,-9,0,0,-10,3.827,0,-9.239,3.4443,0,-8.3151],
// 4 16 3.4443 0 -8.3151 3.827 0 -9.239 7.071 0 -7.071 6.3639 0 -6.3639
  [4,16,3.4443,0,-8.3151,3.827,0,-9.239,7.071,0,-7.071,6.3639,0,-6.3639],
// 4 16 6.3639 0 -6.3639 7.071 0 -7.071 9.239 0 -3.827 8.3151 0 -3.4443
  [4,16,6.3639,0,-6.3639,7.071,0,-7.071,9.239,0,-3.827,8.3151,0,-3.4443],
// 4 16 8.3151 0 -3.4443 9.239 0 -3.827 10 0 0 9 0 0
  [4,16,8.3151,0,-3.4443,9.239,0,-3.827,10,0,0,9,0,0],
// 0
];
module ldraw_lib__4_4ring9(step=0, col=false, unit=2/5, alt=false, line=0.2, solid=!$preview)
    makepoly(ldraw_lib__4_4ring9(), step=step, col=col, unit=unit, alt=alt, line=line, solid=solid);
ldraw_lib__4_4ring9(line=0.2);
// file: ../p/1-16chrd.scad
use <../lib.scad>
use <empty.scad>
function ldraw_lib__1_16chrd() = [
// 0 Chord 0.0625
// 0 Name: 1-16chrd.dat
// 0 Author: Philippe Hurbain [Philo]
// 0 !LDRAW_ORG Primitive UPDATE 2015-01
// 0 !LICENSE Licensed under CC BY 4.0 : see CAreadme.txt
// 
// 0 BFC CERTIFY CCW
  [0,"BFC","CERTIFY"],
  [0,"BFC","CCW"],
// 
// 0 !HISTORY 2015-10-11 [PTadmin] Official Update 2015-01
// 
// 
// 0 // This file is intentionally empty because at the current \P resolution,
// 0 // an 1-16chrd is actually empty. However, this file still is present
// 0 // to allow tools to do primitives substition and fill in a real chrd here,
// 0 // or, if desired, to substitute this with the hi-res 48\1-16chrd.
// 
// 0 // This file is based on an idea by Darats at http://forums.ldraw.org/read.php?19,14500,14500#msg-14500
// 
// 1 16 0 0 0 1 0 0 0 1 0 0 0 1 empty.dat
  [1,16,0,0,0,1,0,0,0,1,0,0,0,1, ldraw_lib__empty()],
];
module ldraw_lib__1_16chrd(step=0, col=false, unit=2/5, alt=false, line=0.2, solid=!$preview)
    makepoly(ldraw_lib__1_16chrd(), step=step, col=col, unit=unit, alt=alt, line=line, solid=solid);
ldraw_lib__1_16chrd(line=0.2);
// file: s/98138s01.scad
use <../../lib.scad>
use <../../p/4-4ring9.scad>
use <98138s02.scad>
function ldraw_lib__s__98138s01() = [
// 0 ~Tile  1 x  1 Round with Groove with Partial Top Face
// 0 Name: s\98138s01.dat
// 0 Author: Magnus Forsberg [MagFors]
// 0 !LDRAW_ORG Subpart UPDATE 2020-01
// 0 !LICENSE Licensed under CC BY 4.0 : see CAreadme.txt
// 
// 0 BFC CERTIFY CCW
  [0,"BFC","CERTIFY"],
  [0,"BFC","CCW"],
// 
// 0 !HISTORY 2011-12-29 [PTadmin] Official Update 2011-02
// 0 !HISTORY 2016-06-17 [MagFors] Reduced the rounded edge to 0.5 ldu
// 0 !HISTORY 2016-12-31 [PTadmin] Official Update 2016-01
// 0 !HISTORY 2019-06-17 [MagFors] Removed the rounded edge
// 0 !HISTORY 2019-07-19 [MagFors] Subfiled without top surface
// 0 !HISTORY 2020-06-28 [PTadmin] Official Update 2020-01
// 
// 
// 1 16 0 0 0 1 0 0 0 1 0 0 0 1 s\98138s02.dat
  [1,16,0,0,0,1,0,0,0,1,0,0,0,1, ldraw_lib__s__98138s02()],
// 1 16 0 0 0 1 0 0 0 1 0 0 0 1 4-4ring9.dat
  [1,16,0,0,0,1,0,0,0,1,0,0,0,1, ldraw_lib__4_4ring9()],
];
module ldraw_lib__s__98138s01(step=0, col=false, unit=2/5, alt=false, line=0.2, solid=!$preview)
    makepoly(ldraw_lib__s__98138s01(), step=step, col=col, unit=unit, alt=alt, line=line, solid=solid);
ldraw_lib__s__98138s01(line=0.2);
// file: ../p/4-4ndis.scad
use <../lib.scad>
function ldraw_lib__4_4ndis() = [
// 0 Disc Negative 1.0
// 0 Name: 4-4ndis.dat
// 0 Author: James Jessiman
// 0 !LDRAW_ORG Primitive UPDATE 2012-01
// 0 !LICENSE Licensed under CC BY 4.0 : see CAreadme.txt
// 
// 0 BFC CERTIFY CCW
  [0,"BFC","CERTIFY"],
  [0,"BFC","CCW"],
// 
// 0 !HISTORY 2002-03-23 [sbliss] Added BFC statement; compacted code
// 0 !HISTORY 2002-04-25 [PTadmin] Official Update 2002-02
// 0 !HISTORY 2007-06-24 [PTadmin] Header formatted for Contributor Agreement
// 0 !HISTORY 2008-07-01 [PTadmin] Official Update 2008-01
// 0 !HISTORY 2012-02-16 [Philo] Changed to CCW
// 0 !HISTORY 2012-03-30 [PTadmin] Official Update 2012-01
// 
// 
// 3 16 0.9239 0 0.3827 1 0 0 1 0 1
  [3,16,0.9239,0,0.3827,1,0,0,1,0,1],
// 3 16 0.7071 0 0.7071 0.9239 0 0.3827 1 0 1
  [3,16,0.7071,0,0.7071,0.9239,0,0.3827,1,0,1],
// 3 16 0.3827 0 0.9239 0.7071 0 0.7071 1 0 1
  [3,16,0.3827,0,0.9239,0.7071,0,0.7071,1,0,1],
// 3 16 0 0 1 0.3827 0 0.9239 1 0 1
  [3,16,0,0,1,0.3827,0,0.9239,1,0,1],
// 3 16 -0.3827 0 0.9239 0 0 1 -1 0 1
  [3,16,-0.3827,0,0.9239,0,0,1,-1,0,1],
// 3 16 -0.7071 0 0.7071 -0.3827 0 0.9239 -1 0 1
  [3,16,-0.7071,0,0.7071,-0.3827,0,0.9239,-1,0,1],
// 3 16 -0.9239 0 0.3827 -0.7071 0 0.7071 -1 0 1
  [3,16,-0.9239,0,0.3827,-0.7071,0,0.7071,-1,0,1],
// 3 16 -1 0 0 -0.9239 0 0.3827 -1 0 1
  [3,16,-1,0,0,-0.9239,0,0.3827,-1,0,1],
// 3 16 -0.9239 0 -0.3827 -1 0 0 -1 0 -1
  [3,16,-0.9239,0,-0.3827,-1,0,0,-1,0,-1],
// 3 16 -0.7071 0 -0.7071 -0.9239 0 -0.3827 -1 0 -1
  [3,16,-0.7071,0,-0.7071,-0.9239,0,-0.3827,-1,0,-1],
// 3 16 -0.3827 0 -0.9239 -0.7071 0 -0.7071 -1 0 -1
  [3,16,-0.3827,0,-0.9239,-0.7071,0,-0.7071,-1,0,-1],
// 3 16 0 0 -1 -0.3827 0 -0.9239 -1 0 -1
  [3,16,0,0,-1,-0.3827,0,-0.9239,-1,0,-1],
// 3 16 0.3827 0 -0.9239 0 0 -1 1 0 -1
  [3,16,0.3827,0,-0.9239,0,0,-1,1,0,-1],
// 3 16 0.7071 0 -0.7071 0.3827 0 -0.9239 1 0 -1
  [3,16,0.7071,0,-0.7071,0.3827,0,-0.9239,1,0,-1],
// 3 16 0.9239 0 -0.3827 0.7071 0 -0.7071 1 0 -1
  [3,16,0.9239,0,-0.3827,0.7071,0,-0.7071,1,0,-1],
// 3 16 1 0 0 0.9239 0 -0.3827 1 0 -1
  [3,16,1,0,0,0.9239,0,-0.3827,1,0,-1],
];
module ldraw_lib__4_4ndis(step=0, col=false, unit=2/5, alt=false, line=0.2, solid=!$preview)
    makepoly(ldraw_lib__4_4ndis(), step=step, col=col, unit=unit, alt=alt, line=line, solid=solid);
ldraw_lib__4_4ndis(line=0.2);
// file: ../p/4-4ering.scad
use <../lib.scad>
use <1-16chrd.scad>
function ldraw_lib__4_4ering() = [
// 0 Adapter Ring Triangles to Normal 1.0
// 0 Name: 4-4ering.dat
// 0 Author: Philippe Hurbain [Philo]
// 0 !LDRAW_ORG Primitive UPDATE 2015-01
// 0 !LICENSE Licensed under CC BY 4.0 : see CAreadme.txt
// 
// 0 BFC CERTIFY CCW
  [0,"BFC","CERTIFY"],
  [0,"BFC","CCW"],
// 
// 0 !HISTORY 2015-10-11 [PTadmin] Official Update 2015-01
// 
// 
// 0 // This file uses 1-16chrd (actually empty). It allows
// 0 // tools to do primitives substition and fill in a ring of chrd here,
// 0 // or, if desired, to substitute this with the hi-res 48\1-16chrd.
// 0 // This file is based on an idea by Darats at http://forums.ldraw.org/read.php?19,14500,14500#msg-14500
// 
// 1 16 0 0 0 1 0 0 0 1 0 0 0 1 1-16chrd.dat
  [1,16,0,0,0,1,0,0,0,1,0,0,0,1, ldraw_lib__1_16chrd()],
// 1 16 0 0 0 0.92388 0 0.38268 0 1 0 -0.38268 0 0.92388 1-16chrd.dat
  [1,16,0,0,0,0.92388,0,0.38268,0,1,0,-0.38268,0,0.92388, ldraw_lib__1_16chrd()],
// 1 16 0 0 0 0.70711 0 0.70711 0 1 0 -0.70711 0 0.70711 1-16chrd.dat
  [1,16,0,0,0,0.70711,0,0.70711,0,1,0,-0.70711,0,0.70711, ldraw_lib__1_16chrd()],
// 1 16 0 0 0 0.38268 0 0.92388 0 1 0 -0.92388 0 0.38268 1-16chrd.dat
  [1,16,0,0,0,0.38268,0,0.92388,0,1,0,-0.92388,0,0.38268, ldraw_lib__1_16chrd()],
// 1 16 0 0 0 0 0 1 0 1 0 -1 0 0 1-16chrd.dat
  [1,16,0,0,0,0,0,1,0,1,0,-1,0,0, ldraw_lib__1_16chrd()],
// 1 16 0 0 0 -0.38268 0 0.92388 0 1 0 -0.92388 0 -0.38268 1-16chrd.dat
  [1,16,0,0,0,-0.38268,0,0.92388,0,1,0,-0.92388,0,-0.38268, ldraw_lib__1_16chrd()],
// 1 16 0 0 0 -0.70711 0 0.70711 0 1 0 -0.70711 0 -0.70711 1-16chrd.dat
  [1,16,0,0,0,-0.70711,0,0.70711,0,1,0,-0.70711,0,-0.70711, ldraw_lib__1_16chrd()],
// 1 16 0 0 0 -0.92388 0 0.38268 0 1 0 -0.38268 0 -0.92388 1-16chrd.dat
  [1,16,0,0,0,-0.92388,0,0.38268,0,1,0,-0.38268,0,-0.92388, ldraw_lib__1_16chrd()],
// 1 16 0 0 0 0 0 -1 0 1 0 1 0 0 1-16chrd.dat
  [1,16,0,0,0,0,0,-1,0,1,0,1,0,0, ldraw_lib__1_16chrd()],
// 1 16 0 0 0 0.38268 0 -0.92388 0 1 0 0.92388 0 0.38268 1-16chrd.dat
  [1,16,0,0,0,0.38268,0,-0.92388,0,1,0,0.92388,0,0.38268, ldraw_lib__1_16chrd()],
// 1 16 0 0 0 0.70711 0 -0.70711 0 1 0 0.70711 0 0.70711 1-16chrd.dat
  [1,16,0,0,0,0.70711,0,-0.70711,0,1,0,0.70711,0,0.70711, ldraw_lib__1_16chrd()],
// 1 16 0 0 0 0.92388 0 -0.38268 0 1 0 0.38268 0 0.92388 1-16chrd.dat
  [1,16,0,0,0,0.92388,0,-0.38268,0,1,0,0.38268,0,0.92388, ldraw_lib__1_16chrd()],
// 1 16 0 0 0 -1 0 0 0 1 0 0 0 -1 1-16chrd.dat
  [1,16,0,0,0,-1,0,0,0,1,0,0,0,-1, ldraw_lib__1_16chrd()],
// 1 16 0 0 0 -0.92388 0 -0.38268 0 1 0 0.38268 0 -0.92388 1-16chrd.dat
  [1,16,0,0,0,-0.92388,0,-0.38268,0,1,0,0.38268,0,-0.92388, ldraw_lib__1_16chrd()],
// 1 16 0 0 0 -0.70711 0 -0.70711 0 1 0 0.70711 0 -0.70711 1-16chrd.dat
  [1,16,0,0,0,-0.70711,0,-0.70711,0,1,0,0.70711,0,-0.70711, ldraw_lib__1_16chrd()],
// 1 16 0 0 0 -0.38268 0 -0.92388 0 1 0 0.92388 0 -0.38268 1-16chrd.dat
  [1,16,0,0,0,-0.38268,0,-0.92388,0,1,0,0.92388,0,-0.38268, ldraw_lib__1_16chrd()],
];
module ldraw_lib__4_4ering(step=0, col=false, unit=2/5, alt=false, line=0.2, solid=!$preview)
    makepoly(ldraw_lib__4_4ering(), step=step, col=col, unit=unit, alt=alt, line=line, solid=solid);
ldraw_lib__4_4ering(line=0.2);
// file: ../p/4-4disc.scad
use <../lib.scad>
function ldraw_lib__4_4disc() = [
// 0 Disc 1.0
// 0 Name: 4-4disc.dat
// 0 Author: James Jessiman
// 0 !LDRAW_ORG Primitive UPDATE 2002-02
// 0 !LICENSE Licensed under CC BY 4.0 : see CAreadme.txt
// 
// 0 BFC CERTIFY CCW
  [0,"BFC","CERTIFY"],
  [0,"BFC","CCW"],
// 
// 0 !HISTORY 1998-12-15 [PTadmin] Official Update 1998-10
// 0 !HISTORY 2002-03-23 [sbliss] Added BFC statement
// 0 !HISTORY 2002-04-25 [PTadmin] Official Update 2002-02
// 0 !HISTORY 2007-06-24 [PTadmin] Header formatted for Contributor Agreement
// 0 !HISTORY 2008-07-01 [PTadmin] Official Update 2008-01
// 
// 
// 3 16 0 0 0 1 0 0 0.9239 0 0.3827
  [3,16,0,0,0,1,0,0,0.9239,0,0.3827],
// 3 16 0 0 0 0.9239 0 0.3827 0.7071 0 0.7071
  [3,16,0,0,0,0.9239,0,0.3827,0.7071,0,0.7071],
// 3 16 0 0 0 0.7071 0 0.7071 0.3827 0 0.9239
  [3,16,0,0,0,0.7071,0,0.7071,0.3827,0,0.9239],
// 3 16 0 0 0 0.3827 0 0.9239 0 0 1
  [3,16,0,0,0,0.3827,0,0.9239,0,0,1],
// 3 16 0 0 0 0 0 1 -0.3827 0 0.9239
  [3,16,0,0,0,0,0,1,-0.3827,0,0.9239],
// 3 16 0 0 0 -0.3827 0 0.9239 -0.7071 0 0.7071
  [3,16,0,0,0,-0.3827,0,0.9239,-0.7071,0,0.7071],
// 3 16 0 0 0 -0.7071 0 0.7071 -0.9239 0 0.3827
  [3,16,0,0,0,-0.7071,0,0.7071,-0.9239,0,0.3827],
// 3 16 0 0 0 -0.9239 0 0.3827 -1 0 -0
  [3,16,0,0,0,-0.9239,0,0.3827,-1,0,-0],
// 3 16 0 0 0 -1 0 -0 -0.9239 0 -0.3827
  [3,16,0,0,0,-1,0,-0,-0.9239,0,-0.3827],
// 3 16 0 0 0 -0.9239 0 -0.3827 -0.7071 0 -0.7071
  [3,16,0,0,0,-0.9239,0,-0.3827,-0.7071,0,-0.7071],
// 3 16 0 0 0 -0.7071 0 -0.7071 -0.3827 0 -0.9239
  [3,16,0,0,0,-0.7071,0,-0.7071,-0.3827,0,-0.9239],
// 3 16 0 0 0 -0.3827 0 -0.9239 0 0 -1
  [3,16,0,0,0,-0.3827,0,-0.9239,0,0,-1],
// 3 16 0 0 0 0 0 -1 0.3827 0 -0.9239
  [3,16,0,0,0,0,0,-1,0.3827,0,-0.9239],
// 3 16 0 0 0 0.3827 0 -0.9239 0.7071 0 -0.7071
  [3,16,0,0,0,0.3827,0,-0.9239,0.7071,0,-0.7071],
// 3 16 0 0 0 0.7071 0 -0.7071 0.9239 0 -0.3827
  [3,16,0,0,0,0.7071,0,-0.7071,0.9239,0,-0.3827],
// 3 16 0 0 0 0.9239 0 -0.3827 1 0 0
  [3,16,0,0,0,0.9239,0,-0.3827,1,0,0],
// 0
];
module ldraw_lib__4_4disc(step=0, col=false, unit=2/5, alt=false, line=0.2, solid=!$preview)
    makepoly(ldraw_lib__4_4disc(), step=step, col=col, unit=unit, alt=alt, line=line, solid=solid);
ldraw_lib__4_4disc(line=0.2);
// main file
use <../lib.scad>
use <../p/4-4disc.scad>
use <../p/4-4ering.scad>
use <../p/4-4ndis.scad>
use <s/98138s01.scad>
function ldraw_lib__98138p0o() = [
// 0 Tile  1 x  1 Round with Two Black Dots Pattern
// 0 Name: 98138p0o.dat
// 0 Author: Gerald Lasser [GeraldLasser]
// 0 !LDRAW_ORG Part UPDATE 2017-01
// 0 !LICENSE Licensed under CC BY 4.0 : see CAreadme.txt
// 
// 0 BFC CERTIFY CCW
  [0,"BFC","CERTIFY"],
  [0,"BFC","CCW"],
// 
// 0 !KEYWORDS BrickLink 98138pb076, Disney Princesses, Olaf
// 
// 0 !HISTORY 2017-12-30 [PTadmin] Official Update 2017-01
// 
// 
// 1 16 0 0 0 1 0 0 0 1 0 0 0 1 s\98138s01.dat
  [1,16,0,0,0,1,0,0,0,1,0,0,0,1, ldraw_lib__s__98138s01()],
// 1 16 0 0 0 9 0 0 0 1 0 0 0 9 4-4ering.dat
  [1,16,0,0,0,9,0,0,0,1,0,0,0,9, ldraw_lib__4_4ering()],
// 1 0 0 0 3.3 1.4 0 0 0 1 0 0 0 1.4 4-4disc.dat
  [1,0,0,0,3.3,1.4,0,0,0,1,0,0,0,1.4, ldraw_lib__4_4disc()],
// 1 0 0 0 -3.3 1.4 0 0 0 1 0 0 0 1.4 4-4disc.dat
  [1,0,0,0,-3.3,1.4,0,0,0,1,0,0,0,1.4, ldraw_lib__4_4disc()],
// 1 16 0 0 -3.3 1.4 0 0 0 1 0 0 0 1.4 4-4ndis.dat
  [1,16,0,0,-3.3,1.4,0,0,0,1,0,0,0,1.4, ldraw_lib__4_4ndis()],
// 1 16 0 0 3.3 1.4 0 0 0 1 0 0 0 1.4 4-4ndis.dat
  [1,16,0,0,3.3,1.4,0,0,0,1,0,0,0,1.4, ldraw_lib__4_4ndis()],
// 4 16 1.4 0 1.9 0 0 1.9 0 0 -1.9 1.4 0 -1.9
  [4,16,1.4,0,1.9,0,0,1.9,0,0,-1.9,1.4,0,-1.9],
// 4 16 0 0 9 0 0 4.7 1.4 0 4.7 3.4443 0 8.3151
  [4,16,0,0,9,0,0,4.7,1.4,0,4.7,3.4443,0,8.3151],
// 4 16 6.3639 0 6.3639 3.4443 0 8.3151 1.4 0 4.7 8.3151 0 3.4443
  [4,16,6.3639,0,6.3639,3.4443,0,8.3151,1.4,0,4.7,8.3151,0,3.4443],
// 3 16 1.4 0 4.7 1.4 0 3.3 8.3151 0 3.4443
  [3,16,1.4,0,4.7,1.4,0,3.3,8.3151,0,3.4443],
// 4 16 8.3151 0 3.4443 1.4 0 3.3 1.4 0 1.9 9 0 0
  [4,16,8.3151,0,3.4443,1.4,0,3.3,1.4,0,1.9,9,0,0],
// 4 16 9 0 0 1.4 0 1.9 1.4 0 -1.9 8.3151 0 -3.4443
  [4,16,9,0,0,1.4,0,1.9,1.4,0,-1.9,8.3151,0,-3.4443],
// 3 16 1.4 0 -1.9 1.4 0 -3.3 8.3151 0 -3.4443
  [3,16,1.4,0,-1.9,1.4,0,-3.3,8.3151,0,-3.4443],
// 4 16 8.3151 0 -3.4443 1.4 0 -3.3 1.4 0 -4.7 6.3639 0 -6.3639
  [4,16,8.3151,0,-3.4443,1.4,0,-3.3,1.4,0,-4.7,6.3639,0,-6.3639],
// 4 16 3.4443 0 -8.3151 6.3639 0 -6.3639 1.4 0 -4.7 0 0 -9
  [4,16,3.4443,0,-8.3151,6.3639,0,-6.3639,1.4,0,-4.7,0,0,-9],
// 3 16 1.4 0 -4.7 0 0 -4.7 0 0 -9
  [3,16,1.4,0,-4.7,0,0,-4.7,0,0,-9],
// 4 16 -1.4 0 4.7 0 0 4.7 0 0 9 -3.4443 0 8.3151
  [4,16,-1.4,0,4.7,0,0,4.7,0,0,9,-3.4443,0,8.3151],
// 4 16 -1.4 0 4.7 -3.4443 0 8.3151 -6.3639 0 6.3639 -8.3151 0 3.4443
  [4,16,-1.4,0,4.7,-3.4443,0,8.3151,-6.3639,0,6.3639,-8.3151,0,3.4443],
// 3 16 -1.4 0 4.7 -8.3151 0 3.4443 -1.4 0 3.3
  [3,16,-1.4,0,4.7,-8.3151,0,3.4443,-1.4,0,3.3],
// 4 16 -1.4 0 1.9 -1.4 0 3.3 -8.3151 0 3.4443 -9 0 0
  [4,16,-1.4,0,1.9,-1.4,0,3.3,-8.3151,0,3.4443,-9,0,0],
// 4 16 -1.4 0 -1.9 -1.4 0 1.9 -9 0 0 -8.3151 0 -3.4443
  [4,16,-1.4,0,-1.9,-1.4,0,1.9,-9,0,0,-8.3151,0,-3.4443],
// 3 16 -1.4 0 -1.9 -8.3151 0 -3.4443 -1.4 0 -3.3
  [3,16,-1.4,0,-1.9,-8.3151,0,-3.4443,-1.4,0,-3.3],
// 4 16 -1.4 0 -4.7 -1.4 0 -3.3 -8.3151 0 -3.4443 -6.3639 0 -6.3639
  [4,16,-1.4,0,-4.7,-1.4,0,-3.3,-8.3151,0,-3.4443,-6.3639,0,-6.3639],
// 4 16 -1.4 0 -4.7 -6.3639 0 -6.3639 -3.4443 0 -8.3151 0 0 -9
  [4,16,-1.4,0,-4.7,-6.3639,0,-6.3639,-3.4443,0,-8.3151,0,0,-9],
// 3 16 0 0 -4.7 -1.4 0 -4.7 0 0 -9
  [3,16,0,0,-4.7,-1.4,0,-4.7,0,0,-9],
// 4 16 0 0 -1.9 0 0 1.9 -1.4 0 1.9 -1.4 0 -1.9
  [4,16,0,0,-1.9,0,0,1.9,-1.4,0,1.9,-1.4,0,-1.9],
];
module ldraw_lib__98138p0o(step=0, col=false, unit=2/5, alt=false, line=0.2, solid=!$preview)
    makepoly(ldraw_lib__98138p0o(), step=step, col=col, unit=unit, alt=alt, line=line, solid=solid);
ldraw_lib__98138p0o(line=0.2);
